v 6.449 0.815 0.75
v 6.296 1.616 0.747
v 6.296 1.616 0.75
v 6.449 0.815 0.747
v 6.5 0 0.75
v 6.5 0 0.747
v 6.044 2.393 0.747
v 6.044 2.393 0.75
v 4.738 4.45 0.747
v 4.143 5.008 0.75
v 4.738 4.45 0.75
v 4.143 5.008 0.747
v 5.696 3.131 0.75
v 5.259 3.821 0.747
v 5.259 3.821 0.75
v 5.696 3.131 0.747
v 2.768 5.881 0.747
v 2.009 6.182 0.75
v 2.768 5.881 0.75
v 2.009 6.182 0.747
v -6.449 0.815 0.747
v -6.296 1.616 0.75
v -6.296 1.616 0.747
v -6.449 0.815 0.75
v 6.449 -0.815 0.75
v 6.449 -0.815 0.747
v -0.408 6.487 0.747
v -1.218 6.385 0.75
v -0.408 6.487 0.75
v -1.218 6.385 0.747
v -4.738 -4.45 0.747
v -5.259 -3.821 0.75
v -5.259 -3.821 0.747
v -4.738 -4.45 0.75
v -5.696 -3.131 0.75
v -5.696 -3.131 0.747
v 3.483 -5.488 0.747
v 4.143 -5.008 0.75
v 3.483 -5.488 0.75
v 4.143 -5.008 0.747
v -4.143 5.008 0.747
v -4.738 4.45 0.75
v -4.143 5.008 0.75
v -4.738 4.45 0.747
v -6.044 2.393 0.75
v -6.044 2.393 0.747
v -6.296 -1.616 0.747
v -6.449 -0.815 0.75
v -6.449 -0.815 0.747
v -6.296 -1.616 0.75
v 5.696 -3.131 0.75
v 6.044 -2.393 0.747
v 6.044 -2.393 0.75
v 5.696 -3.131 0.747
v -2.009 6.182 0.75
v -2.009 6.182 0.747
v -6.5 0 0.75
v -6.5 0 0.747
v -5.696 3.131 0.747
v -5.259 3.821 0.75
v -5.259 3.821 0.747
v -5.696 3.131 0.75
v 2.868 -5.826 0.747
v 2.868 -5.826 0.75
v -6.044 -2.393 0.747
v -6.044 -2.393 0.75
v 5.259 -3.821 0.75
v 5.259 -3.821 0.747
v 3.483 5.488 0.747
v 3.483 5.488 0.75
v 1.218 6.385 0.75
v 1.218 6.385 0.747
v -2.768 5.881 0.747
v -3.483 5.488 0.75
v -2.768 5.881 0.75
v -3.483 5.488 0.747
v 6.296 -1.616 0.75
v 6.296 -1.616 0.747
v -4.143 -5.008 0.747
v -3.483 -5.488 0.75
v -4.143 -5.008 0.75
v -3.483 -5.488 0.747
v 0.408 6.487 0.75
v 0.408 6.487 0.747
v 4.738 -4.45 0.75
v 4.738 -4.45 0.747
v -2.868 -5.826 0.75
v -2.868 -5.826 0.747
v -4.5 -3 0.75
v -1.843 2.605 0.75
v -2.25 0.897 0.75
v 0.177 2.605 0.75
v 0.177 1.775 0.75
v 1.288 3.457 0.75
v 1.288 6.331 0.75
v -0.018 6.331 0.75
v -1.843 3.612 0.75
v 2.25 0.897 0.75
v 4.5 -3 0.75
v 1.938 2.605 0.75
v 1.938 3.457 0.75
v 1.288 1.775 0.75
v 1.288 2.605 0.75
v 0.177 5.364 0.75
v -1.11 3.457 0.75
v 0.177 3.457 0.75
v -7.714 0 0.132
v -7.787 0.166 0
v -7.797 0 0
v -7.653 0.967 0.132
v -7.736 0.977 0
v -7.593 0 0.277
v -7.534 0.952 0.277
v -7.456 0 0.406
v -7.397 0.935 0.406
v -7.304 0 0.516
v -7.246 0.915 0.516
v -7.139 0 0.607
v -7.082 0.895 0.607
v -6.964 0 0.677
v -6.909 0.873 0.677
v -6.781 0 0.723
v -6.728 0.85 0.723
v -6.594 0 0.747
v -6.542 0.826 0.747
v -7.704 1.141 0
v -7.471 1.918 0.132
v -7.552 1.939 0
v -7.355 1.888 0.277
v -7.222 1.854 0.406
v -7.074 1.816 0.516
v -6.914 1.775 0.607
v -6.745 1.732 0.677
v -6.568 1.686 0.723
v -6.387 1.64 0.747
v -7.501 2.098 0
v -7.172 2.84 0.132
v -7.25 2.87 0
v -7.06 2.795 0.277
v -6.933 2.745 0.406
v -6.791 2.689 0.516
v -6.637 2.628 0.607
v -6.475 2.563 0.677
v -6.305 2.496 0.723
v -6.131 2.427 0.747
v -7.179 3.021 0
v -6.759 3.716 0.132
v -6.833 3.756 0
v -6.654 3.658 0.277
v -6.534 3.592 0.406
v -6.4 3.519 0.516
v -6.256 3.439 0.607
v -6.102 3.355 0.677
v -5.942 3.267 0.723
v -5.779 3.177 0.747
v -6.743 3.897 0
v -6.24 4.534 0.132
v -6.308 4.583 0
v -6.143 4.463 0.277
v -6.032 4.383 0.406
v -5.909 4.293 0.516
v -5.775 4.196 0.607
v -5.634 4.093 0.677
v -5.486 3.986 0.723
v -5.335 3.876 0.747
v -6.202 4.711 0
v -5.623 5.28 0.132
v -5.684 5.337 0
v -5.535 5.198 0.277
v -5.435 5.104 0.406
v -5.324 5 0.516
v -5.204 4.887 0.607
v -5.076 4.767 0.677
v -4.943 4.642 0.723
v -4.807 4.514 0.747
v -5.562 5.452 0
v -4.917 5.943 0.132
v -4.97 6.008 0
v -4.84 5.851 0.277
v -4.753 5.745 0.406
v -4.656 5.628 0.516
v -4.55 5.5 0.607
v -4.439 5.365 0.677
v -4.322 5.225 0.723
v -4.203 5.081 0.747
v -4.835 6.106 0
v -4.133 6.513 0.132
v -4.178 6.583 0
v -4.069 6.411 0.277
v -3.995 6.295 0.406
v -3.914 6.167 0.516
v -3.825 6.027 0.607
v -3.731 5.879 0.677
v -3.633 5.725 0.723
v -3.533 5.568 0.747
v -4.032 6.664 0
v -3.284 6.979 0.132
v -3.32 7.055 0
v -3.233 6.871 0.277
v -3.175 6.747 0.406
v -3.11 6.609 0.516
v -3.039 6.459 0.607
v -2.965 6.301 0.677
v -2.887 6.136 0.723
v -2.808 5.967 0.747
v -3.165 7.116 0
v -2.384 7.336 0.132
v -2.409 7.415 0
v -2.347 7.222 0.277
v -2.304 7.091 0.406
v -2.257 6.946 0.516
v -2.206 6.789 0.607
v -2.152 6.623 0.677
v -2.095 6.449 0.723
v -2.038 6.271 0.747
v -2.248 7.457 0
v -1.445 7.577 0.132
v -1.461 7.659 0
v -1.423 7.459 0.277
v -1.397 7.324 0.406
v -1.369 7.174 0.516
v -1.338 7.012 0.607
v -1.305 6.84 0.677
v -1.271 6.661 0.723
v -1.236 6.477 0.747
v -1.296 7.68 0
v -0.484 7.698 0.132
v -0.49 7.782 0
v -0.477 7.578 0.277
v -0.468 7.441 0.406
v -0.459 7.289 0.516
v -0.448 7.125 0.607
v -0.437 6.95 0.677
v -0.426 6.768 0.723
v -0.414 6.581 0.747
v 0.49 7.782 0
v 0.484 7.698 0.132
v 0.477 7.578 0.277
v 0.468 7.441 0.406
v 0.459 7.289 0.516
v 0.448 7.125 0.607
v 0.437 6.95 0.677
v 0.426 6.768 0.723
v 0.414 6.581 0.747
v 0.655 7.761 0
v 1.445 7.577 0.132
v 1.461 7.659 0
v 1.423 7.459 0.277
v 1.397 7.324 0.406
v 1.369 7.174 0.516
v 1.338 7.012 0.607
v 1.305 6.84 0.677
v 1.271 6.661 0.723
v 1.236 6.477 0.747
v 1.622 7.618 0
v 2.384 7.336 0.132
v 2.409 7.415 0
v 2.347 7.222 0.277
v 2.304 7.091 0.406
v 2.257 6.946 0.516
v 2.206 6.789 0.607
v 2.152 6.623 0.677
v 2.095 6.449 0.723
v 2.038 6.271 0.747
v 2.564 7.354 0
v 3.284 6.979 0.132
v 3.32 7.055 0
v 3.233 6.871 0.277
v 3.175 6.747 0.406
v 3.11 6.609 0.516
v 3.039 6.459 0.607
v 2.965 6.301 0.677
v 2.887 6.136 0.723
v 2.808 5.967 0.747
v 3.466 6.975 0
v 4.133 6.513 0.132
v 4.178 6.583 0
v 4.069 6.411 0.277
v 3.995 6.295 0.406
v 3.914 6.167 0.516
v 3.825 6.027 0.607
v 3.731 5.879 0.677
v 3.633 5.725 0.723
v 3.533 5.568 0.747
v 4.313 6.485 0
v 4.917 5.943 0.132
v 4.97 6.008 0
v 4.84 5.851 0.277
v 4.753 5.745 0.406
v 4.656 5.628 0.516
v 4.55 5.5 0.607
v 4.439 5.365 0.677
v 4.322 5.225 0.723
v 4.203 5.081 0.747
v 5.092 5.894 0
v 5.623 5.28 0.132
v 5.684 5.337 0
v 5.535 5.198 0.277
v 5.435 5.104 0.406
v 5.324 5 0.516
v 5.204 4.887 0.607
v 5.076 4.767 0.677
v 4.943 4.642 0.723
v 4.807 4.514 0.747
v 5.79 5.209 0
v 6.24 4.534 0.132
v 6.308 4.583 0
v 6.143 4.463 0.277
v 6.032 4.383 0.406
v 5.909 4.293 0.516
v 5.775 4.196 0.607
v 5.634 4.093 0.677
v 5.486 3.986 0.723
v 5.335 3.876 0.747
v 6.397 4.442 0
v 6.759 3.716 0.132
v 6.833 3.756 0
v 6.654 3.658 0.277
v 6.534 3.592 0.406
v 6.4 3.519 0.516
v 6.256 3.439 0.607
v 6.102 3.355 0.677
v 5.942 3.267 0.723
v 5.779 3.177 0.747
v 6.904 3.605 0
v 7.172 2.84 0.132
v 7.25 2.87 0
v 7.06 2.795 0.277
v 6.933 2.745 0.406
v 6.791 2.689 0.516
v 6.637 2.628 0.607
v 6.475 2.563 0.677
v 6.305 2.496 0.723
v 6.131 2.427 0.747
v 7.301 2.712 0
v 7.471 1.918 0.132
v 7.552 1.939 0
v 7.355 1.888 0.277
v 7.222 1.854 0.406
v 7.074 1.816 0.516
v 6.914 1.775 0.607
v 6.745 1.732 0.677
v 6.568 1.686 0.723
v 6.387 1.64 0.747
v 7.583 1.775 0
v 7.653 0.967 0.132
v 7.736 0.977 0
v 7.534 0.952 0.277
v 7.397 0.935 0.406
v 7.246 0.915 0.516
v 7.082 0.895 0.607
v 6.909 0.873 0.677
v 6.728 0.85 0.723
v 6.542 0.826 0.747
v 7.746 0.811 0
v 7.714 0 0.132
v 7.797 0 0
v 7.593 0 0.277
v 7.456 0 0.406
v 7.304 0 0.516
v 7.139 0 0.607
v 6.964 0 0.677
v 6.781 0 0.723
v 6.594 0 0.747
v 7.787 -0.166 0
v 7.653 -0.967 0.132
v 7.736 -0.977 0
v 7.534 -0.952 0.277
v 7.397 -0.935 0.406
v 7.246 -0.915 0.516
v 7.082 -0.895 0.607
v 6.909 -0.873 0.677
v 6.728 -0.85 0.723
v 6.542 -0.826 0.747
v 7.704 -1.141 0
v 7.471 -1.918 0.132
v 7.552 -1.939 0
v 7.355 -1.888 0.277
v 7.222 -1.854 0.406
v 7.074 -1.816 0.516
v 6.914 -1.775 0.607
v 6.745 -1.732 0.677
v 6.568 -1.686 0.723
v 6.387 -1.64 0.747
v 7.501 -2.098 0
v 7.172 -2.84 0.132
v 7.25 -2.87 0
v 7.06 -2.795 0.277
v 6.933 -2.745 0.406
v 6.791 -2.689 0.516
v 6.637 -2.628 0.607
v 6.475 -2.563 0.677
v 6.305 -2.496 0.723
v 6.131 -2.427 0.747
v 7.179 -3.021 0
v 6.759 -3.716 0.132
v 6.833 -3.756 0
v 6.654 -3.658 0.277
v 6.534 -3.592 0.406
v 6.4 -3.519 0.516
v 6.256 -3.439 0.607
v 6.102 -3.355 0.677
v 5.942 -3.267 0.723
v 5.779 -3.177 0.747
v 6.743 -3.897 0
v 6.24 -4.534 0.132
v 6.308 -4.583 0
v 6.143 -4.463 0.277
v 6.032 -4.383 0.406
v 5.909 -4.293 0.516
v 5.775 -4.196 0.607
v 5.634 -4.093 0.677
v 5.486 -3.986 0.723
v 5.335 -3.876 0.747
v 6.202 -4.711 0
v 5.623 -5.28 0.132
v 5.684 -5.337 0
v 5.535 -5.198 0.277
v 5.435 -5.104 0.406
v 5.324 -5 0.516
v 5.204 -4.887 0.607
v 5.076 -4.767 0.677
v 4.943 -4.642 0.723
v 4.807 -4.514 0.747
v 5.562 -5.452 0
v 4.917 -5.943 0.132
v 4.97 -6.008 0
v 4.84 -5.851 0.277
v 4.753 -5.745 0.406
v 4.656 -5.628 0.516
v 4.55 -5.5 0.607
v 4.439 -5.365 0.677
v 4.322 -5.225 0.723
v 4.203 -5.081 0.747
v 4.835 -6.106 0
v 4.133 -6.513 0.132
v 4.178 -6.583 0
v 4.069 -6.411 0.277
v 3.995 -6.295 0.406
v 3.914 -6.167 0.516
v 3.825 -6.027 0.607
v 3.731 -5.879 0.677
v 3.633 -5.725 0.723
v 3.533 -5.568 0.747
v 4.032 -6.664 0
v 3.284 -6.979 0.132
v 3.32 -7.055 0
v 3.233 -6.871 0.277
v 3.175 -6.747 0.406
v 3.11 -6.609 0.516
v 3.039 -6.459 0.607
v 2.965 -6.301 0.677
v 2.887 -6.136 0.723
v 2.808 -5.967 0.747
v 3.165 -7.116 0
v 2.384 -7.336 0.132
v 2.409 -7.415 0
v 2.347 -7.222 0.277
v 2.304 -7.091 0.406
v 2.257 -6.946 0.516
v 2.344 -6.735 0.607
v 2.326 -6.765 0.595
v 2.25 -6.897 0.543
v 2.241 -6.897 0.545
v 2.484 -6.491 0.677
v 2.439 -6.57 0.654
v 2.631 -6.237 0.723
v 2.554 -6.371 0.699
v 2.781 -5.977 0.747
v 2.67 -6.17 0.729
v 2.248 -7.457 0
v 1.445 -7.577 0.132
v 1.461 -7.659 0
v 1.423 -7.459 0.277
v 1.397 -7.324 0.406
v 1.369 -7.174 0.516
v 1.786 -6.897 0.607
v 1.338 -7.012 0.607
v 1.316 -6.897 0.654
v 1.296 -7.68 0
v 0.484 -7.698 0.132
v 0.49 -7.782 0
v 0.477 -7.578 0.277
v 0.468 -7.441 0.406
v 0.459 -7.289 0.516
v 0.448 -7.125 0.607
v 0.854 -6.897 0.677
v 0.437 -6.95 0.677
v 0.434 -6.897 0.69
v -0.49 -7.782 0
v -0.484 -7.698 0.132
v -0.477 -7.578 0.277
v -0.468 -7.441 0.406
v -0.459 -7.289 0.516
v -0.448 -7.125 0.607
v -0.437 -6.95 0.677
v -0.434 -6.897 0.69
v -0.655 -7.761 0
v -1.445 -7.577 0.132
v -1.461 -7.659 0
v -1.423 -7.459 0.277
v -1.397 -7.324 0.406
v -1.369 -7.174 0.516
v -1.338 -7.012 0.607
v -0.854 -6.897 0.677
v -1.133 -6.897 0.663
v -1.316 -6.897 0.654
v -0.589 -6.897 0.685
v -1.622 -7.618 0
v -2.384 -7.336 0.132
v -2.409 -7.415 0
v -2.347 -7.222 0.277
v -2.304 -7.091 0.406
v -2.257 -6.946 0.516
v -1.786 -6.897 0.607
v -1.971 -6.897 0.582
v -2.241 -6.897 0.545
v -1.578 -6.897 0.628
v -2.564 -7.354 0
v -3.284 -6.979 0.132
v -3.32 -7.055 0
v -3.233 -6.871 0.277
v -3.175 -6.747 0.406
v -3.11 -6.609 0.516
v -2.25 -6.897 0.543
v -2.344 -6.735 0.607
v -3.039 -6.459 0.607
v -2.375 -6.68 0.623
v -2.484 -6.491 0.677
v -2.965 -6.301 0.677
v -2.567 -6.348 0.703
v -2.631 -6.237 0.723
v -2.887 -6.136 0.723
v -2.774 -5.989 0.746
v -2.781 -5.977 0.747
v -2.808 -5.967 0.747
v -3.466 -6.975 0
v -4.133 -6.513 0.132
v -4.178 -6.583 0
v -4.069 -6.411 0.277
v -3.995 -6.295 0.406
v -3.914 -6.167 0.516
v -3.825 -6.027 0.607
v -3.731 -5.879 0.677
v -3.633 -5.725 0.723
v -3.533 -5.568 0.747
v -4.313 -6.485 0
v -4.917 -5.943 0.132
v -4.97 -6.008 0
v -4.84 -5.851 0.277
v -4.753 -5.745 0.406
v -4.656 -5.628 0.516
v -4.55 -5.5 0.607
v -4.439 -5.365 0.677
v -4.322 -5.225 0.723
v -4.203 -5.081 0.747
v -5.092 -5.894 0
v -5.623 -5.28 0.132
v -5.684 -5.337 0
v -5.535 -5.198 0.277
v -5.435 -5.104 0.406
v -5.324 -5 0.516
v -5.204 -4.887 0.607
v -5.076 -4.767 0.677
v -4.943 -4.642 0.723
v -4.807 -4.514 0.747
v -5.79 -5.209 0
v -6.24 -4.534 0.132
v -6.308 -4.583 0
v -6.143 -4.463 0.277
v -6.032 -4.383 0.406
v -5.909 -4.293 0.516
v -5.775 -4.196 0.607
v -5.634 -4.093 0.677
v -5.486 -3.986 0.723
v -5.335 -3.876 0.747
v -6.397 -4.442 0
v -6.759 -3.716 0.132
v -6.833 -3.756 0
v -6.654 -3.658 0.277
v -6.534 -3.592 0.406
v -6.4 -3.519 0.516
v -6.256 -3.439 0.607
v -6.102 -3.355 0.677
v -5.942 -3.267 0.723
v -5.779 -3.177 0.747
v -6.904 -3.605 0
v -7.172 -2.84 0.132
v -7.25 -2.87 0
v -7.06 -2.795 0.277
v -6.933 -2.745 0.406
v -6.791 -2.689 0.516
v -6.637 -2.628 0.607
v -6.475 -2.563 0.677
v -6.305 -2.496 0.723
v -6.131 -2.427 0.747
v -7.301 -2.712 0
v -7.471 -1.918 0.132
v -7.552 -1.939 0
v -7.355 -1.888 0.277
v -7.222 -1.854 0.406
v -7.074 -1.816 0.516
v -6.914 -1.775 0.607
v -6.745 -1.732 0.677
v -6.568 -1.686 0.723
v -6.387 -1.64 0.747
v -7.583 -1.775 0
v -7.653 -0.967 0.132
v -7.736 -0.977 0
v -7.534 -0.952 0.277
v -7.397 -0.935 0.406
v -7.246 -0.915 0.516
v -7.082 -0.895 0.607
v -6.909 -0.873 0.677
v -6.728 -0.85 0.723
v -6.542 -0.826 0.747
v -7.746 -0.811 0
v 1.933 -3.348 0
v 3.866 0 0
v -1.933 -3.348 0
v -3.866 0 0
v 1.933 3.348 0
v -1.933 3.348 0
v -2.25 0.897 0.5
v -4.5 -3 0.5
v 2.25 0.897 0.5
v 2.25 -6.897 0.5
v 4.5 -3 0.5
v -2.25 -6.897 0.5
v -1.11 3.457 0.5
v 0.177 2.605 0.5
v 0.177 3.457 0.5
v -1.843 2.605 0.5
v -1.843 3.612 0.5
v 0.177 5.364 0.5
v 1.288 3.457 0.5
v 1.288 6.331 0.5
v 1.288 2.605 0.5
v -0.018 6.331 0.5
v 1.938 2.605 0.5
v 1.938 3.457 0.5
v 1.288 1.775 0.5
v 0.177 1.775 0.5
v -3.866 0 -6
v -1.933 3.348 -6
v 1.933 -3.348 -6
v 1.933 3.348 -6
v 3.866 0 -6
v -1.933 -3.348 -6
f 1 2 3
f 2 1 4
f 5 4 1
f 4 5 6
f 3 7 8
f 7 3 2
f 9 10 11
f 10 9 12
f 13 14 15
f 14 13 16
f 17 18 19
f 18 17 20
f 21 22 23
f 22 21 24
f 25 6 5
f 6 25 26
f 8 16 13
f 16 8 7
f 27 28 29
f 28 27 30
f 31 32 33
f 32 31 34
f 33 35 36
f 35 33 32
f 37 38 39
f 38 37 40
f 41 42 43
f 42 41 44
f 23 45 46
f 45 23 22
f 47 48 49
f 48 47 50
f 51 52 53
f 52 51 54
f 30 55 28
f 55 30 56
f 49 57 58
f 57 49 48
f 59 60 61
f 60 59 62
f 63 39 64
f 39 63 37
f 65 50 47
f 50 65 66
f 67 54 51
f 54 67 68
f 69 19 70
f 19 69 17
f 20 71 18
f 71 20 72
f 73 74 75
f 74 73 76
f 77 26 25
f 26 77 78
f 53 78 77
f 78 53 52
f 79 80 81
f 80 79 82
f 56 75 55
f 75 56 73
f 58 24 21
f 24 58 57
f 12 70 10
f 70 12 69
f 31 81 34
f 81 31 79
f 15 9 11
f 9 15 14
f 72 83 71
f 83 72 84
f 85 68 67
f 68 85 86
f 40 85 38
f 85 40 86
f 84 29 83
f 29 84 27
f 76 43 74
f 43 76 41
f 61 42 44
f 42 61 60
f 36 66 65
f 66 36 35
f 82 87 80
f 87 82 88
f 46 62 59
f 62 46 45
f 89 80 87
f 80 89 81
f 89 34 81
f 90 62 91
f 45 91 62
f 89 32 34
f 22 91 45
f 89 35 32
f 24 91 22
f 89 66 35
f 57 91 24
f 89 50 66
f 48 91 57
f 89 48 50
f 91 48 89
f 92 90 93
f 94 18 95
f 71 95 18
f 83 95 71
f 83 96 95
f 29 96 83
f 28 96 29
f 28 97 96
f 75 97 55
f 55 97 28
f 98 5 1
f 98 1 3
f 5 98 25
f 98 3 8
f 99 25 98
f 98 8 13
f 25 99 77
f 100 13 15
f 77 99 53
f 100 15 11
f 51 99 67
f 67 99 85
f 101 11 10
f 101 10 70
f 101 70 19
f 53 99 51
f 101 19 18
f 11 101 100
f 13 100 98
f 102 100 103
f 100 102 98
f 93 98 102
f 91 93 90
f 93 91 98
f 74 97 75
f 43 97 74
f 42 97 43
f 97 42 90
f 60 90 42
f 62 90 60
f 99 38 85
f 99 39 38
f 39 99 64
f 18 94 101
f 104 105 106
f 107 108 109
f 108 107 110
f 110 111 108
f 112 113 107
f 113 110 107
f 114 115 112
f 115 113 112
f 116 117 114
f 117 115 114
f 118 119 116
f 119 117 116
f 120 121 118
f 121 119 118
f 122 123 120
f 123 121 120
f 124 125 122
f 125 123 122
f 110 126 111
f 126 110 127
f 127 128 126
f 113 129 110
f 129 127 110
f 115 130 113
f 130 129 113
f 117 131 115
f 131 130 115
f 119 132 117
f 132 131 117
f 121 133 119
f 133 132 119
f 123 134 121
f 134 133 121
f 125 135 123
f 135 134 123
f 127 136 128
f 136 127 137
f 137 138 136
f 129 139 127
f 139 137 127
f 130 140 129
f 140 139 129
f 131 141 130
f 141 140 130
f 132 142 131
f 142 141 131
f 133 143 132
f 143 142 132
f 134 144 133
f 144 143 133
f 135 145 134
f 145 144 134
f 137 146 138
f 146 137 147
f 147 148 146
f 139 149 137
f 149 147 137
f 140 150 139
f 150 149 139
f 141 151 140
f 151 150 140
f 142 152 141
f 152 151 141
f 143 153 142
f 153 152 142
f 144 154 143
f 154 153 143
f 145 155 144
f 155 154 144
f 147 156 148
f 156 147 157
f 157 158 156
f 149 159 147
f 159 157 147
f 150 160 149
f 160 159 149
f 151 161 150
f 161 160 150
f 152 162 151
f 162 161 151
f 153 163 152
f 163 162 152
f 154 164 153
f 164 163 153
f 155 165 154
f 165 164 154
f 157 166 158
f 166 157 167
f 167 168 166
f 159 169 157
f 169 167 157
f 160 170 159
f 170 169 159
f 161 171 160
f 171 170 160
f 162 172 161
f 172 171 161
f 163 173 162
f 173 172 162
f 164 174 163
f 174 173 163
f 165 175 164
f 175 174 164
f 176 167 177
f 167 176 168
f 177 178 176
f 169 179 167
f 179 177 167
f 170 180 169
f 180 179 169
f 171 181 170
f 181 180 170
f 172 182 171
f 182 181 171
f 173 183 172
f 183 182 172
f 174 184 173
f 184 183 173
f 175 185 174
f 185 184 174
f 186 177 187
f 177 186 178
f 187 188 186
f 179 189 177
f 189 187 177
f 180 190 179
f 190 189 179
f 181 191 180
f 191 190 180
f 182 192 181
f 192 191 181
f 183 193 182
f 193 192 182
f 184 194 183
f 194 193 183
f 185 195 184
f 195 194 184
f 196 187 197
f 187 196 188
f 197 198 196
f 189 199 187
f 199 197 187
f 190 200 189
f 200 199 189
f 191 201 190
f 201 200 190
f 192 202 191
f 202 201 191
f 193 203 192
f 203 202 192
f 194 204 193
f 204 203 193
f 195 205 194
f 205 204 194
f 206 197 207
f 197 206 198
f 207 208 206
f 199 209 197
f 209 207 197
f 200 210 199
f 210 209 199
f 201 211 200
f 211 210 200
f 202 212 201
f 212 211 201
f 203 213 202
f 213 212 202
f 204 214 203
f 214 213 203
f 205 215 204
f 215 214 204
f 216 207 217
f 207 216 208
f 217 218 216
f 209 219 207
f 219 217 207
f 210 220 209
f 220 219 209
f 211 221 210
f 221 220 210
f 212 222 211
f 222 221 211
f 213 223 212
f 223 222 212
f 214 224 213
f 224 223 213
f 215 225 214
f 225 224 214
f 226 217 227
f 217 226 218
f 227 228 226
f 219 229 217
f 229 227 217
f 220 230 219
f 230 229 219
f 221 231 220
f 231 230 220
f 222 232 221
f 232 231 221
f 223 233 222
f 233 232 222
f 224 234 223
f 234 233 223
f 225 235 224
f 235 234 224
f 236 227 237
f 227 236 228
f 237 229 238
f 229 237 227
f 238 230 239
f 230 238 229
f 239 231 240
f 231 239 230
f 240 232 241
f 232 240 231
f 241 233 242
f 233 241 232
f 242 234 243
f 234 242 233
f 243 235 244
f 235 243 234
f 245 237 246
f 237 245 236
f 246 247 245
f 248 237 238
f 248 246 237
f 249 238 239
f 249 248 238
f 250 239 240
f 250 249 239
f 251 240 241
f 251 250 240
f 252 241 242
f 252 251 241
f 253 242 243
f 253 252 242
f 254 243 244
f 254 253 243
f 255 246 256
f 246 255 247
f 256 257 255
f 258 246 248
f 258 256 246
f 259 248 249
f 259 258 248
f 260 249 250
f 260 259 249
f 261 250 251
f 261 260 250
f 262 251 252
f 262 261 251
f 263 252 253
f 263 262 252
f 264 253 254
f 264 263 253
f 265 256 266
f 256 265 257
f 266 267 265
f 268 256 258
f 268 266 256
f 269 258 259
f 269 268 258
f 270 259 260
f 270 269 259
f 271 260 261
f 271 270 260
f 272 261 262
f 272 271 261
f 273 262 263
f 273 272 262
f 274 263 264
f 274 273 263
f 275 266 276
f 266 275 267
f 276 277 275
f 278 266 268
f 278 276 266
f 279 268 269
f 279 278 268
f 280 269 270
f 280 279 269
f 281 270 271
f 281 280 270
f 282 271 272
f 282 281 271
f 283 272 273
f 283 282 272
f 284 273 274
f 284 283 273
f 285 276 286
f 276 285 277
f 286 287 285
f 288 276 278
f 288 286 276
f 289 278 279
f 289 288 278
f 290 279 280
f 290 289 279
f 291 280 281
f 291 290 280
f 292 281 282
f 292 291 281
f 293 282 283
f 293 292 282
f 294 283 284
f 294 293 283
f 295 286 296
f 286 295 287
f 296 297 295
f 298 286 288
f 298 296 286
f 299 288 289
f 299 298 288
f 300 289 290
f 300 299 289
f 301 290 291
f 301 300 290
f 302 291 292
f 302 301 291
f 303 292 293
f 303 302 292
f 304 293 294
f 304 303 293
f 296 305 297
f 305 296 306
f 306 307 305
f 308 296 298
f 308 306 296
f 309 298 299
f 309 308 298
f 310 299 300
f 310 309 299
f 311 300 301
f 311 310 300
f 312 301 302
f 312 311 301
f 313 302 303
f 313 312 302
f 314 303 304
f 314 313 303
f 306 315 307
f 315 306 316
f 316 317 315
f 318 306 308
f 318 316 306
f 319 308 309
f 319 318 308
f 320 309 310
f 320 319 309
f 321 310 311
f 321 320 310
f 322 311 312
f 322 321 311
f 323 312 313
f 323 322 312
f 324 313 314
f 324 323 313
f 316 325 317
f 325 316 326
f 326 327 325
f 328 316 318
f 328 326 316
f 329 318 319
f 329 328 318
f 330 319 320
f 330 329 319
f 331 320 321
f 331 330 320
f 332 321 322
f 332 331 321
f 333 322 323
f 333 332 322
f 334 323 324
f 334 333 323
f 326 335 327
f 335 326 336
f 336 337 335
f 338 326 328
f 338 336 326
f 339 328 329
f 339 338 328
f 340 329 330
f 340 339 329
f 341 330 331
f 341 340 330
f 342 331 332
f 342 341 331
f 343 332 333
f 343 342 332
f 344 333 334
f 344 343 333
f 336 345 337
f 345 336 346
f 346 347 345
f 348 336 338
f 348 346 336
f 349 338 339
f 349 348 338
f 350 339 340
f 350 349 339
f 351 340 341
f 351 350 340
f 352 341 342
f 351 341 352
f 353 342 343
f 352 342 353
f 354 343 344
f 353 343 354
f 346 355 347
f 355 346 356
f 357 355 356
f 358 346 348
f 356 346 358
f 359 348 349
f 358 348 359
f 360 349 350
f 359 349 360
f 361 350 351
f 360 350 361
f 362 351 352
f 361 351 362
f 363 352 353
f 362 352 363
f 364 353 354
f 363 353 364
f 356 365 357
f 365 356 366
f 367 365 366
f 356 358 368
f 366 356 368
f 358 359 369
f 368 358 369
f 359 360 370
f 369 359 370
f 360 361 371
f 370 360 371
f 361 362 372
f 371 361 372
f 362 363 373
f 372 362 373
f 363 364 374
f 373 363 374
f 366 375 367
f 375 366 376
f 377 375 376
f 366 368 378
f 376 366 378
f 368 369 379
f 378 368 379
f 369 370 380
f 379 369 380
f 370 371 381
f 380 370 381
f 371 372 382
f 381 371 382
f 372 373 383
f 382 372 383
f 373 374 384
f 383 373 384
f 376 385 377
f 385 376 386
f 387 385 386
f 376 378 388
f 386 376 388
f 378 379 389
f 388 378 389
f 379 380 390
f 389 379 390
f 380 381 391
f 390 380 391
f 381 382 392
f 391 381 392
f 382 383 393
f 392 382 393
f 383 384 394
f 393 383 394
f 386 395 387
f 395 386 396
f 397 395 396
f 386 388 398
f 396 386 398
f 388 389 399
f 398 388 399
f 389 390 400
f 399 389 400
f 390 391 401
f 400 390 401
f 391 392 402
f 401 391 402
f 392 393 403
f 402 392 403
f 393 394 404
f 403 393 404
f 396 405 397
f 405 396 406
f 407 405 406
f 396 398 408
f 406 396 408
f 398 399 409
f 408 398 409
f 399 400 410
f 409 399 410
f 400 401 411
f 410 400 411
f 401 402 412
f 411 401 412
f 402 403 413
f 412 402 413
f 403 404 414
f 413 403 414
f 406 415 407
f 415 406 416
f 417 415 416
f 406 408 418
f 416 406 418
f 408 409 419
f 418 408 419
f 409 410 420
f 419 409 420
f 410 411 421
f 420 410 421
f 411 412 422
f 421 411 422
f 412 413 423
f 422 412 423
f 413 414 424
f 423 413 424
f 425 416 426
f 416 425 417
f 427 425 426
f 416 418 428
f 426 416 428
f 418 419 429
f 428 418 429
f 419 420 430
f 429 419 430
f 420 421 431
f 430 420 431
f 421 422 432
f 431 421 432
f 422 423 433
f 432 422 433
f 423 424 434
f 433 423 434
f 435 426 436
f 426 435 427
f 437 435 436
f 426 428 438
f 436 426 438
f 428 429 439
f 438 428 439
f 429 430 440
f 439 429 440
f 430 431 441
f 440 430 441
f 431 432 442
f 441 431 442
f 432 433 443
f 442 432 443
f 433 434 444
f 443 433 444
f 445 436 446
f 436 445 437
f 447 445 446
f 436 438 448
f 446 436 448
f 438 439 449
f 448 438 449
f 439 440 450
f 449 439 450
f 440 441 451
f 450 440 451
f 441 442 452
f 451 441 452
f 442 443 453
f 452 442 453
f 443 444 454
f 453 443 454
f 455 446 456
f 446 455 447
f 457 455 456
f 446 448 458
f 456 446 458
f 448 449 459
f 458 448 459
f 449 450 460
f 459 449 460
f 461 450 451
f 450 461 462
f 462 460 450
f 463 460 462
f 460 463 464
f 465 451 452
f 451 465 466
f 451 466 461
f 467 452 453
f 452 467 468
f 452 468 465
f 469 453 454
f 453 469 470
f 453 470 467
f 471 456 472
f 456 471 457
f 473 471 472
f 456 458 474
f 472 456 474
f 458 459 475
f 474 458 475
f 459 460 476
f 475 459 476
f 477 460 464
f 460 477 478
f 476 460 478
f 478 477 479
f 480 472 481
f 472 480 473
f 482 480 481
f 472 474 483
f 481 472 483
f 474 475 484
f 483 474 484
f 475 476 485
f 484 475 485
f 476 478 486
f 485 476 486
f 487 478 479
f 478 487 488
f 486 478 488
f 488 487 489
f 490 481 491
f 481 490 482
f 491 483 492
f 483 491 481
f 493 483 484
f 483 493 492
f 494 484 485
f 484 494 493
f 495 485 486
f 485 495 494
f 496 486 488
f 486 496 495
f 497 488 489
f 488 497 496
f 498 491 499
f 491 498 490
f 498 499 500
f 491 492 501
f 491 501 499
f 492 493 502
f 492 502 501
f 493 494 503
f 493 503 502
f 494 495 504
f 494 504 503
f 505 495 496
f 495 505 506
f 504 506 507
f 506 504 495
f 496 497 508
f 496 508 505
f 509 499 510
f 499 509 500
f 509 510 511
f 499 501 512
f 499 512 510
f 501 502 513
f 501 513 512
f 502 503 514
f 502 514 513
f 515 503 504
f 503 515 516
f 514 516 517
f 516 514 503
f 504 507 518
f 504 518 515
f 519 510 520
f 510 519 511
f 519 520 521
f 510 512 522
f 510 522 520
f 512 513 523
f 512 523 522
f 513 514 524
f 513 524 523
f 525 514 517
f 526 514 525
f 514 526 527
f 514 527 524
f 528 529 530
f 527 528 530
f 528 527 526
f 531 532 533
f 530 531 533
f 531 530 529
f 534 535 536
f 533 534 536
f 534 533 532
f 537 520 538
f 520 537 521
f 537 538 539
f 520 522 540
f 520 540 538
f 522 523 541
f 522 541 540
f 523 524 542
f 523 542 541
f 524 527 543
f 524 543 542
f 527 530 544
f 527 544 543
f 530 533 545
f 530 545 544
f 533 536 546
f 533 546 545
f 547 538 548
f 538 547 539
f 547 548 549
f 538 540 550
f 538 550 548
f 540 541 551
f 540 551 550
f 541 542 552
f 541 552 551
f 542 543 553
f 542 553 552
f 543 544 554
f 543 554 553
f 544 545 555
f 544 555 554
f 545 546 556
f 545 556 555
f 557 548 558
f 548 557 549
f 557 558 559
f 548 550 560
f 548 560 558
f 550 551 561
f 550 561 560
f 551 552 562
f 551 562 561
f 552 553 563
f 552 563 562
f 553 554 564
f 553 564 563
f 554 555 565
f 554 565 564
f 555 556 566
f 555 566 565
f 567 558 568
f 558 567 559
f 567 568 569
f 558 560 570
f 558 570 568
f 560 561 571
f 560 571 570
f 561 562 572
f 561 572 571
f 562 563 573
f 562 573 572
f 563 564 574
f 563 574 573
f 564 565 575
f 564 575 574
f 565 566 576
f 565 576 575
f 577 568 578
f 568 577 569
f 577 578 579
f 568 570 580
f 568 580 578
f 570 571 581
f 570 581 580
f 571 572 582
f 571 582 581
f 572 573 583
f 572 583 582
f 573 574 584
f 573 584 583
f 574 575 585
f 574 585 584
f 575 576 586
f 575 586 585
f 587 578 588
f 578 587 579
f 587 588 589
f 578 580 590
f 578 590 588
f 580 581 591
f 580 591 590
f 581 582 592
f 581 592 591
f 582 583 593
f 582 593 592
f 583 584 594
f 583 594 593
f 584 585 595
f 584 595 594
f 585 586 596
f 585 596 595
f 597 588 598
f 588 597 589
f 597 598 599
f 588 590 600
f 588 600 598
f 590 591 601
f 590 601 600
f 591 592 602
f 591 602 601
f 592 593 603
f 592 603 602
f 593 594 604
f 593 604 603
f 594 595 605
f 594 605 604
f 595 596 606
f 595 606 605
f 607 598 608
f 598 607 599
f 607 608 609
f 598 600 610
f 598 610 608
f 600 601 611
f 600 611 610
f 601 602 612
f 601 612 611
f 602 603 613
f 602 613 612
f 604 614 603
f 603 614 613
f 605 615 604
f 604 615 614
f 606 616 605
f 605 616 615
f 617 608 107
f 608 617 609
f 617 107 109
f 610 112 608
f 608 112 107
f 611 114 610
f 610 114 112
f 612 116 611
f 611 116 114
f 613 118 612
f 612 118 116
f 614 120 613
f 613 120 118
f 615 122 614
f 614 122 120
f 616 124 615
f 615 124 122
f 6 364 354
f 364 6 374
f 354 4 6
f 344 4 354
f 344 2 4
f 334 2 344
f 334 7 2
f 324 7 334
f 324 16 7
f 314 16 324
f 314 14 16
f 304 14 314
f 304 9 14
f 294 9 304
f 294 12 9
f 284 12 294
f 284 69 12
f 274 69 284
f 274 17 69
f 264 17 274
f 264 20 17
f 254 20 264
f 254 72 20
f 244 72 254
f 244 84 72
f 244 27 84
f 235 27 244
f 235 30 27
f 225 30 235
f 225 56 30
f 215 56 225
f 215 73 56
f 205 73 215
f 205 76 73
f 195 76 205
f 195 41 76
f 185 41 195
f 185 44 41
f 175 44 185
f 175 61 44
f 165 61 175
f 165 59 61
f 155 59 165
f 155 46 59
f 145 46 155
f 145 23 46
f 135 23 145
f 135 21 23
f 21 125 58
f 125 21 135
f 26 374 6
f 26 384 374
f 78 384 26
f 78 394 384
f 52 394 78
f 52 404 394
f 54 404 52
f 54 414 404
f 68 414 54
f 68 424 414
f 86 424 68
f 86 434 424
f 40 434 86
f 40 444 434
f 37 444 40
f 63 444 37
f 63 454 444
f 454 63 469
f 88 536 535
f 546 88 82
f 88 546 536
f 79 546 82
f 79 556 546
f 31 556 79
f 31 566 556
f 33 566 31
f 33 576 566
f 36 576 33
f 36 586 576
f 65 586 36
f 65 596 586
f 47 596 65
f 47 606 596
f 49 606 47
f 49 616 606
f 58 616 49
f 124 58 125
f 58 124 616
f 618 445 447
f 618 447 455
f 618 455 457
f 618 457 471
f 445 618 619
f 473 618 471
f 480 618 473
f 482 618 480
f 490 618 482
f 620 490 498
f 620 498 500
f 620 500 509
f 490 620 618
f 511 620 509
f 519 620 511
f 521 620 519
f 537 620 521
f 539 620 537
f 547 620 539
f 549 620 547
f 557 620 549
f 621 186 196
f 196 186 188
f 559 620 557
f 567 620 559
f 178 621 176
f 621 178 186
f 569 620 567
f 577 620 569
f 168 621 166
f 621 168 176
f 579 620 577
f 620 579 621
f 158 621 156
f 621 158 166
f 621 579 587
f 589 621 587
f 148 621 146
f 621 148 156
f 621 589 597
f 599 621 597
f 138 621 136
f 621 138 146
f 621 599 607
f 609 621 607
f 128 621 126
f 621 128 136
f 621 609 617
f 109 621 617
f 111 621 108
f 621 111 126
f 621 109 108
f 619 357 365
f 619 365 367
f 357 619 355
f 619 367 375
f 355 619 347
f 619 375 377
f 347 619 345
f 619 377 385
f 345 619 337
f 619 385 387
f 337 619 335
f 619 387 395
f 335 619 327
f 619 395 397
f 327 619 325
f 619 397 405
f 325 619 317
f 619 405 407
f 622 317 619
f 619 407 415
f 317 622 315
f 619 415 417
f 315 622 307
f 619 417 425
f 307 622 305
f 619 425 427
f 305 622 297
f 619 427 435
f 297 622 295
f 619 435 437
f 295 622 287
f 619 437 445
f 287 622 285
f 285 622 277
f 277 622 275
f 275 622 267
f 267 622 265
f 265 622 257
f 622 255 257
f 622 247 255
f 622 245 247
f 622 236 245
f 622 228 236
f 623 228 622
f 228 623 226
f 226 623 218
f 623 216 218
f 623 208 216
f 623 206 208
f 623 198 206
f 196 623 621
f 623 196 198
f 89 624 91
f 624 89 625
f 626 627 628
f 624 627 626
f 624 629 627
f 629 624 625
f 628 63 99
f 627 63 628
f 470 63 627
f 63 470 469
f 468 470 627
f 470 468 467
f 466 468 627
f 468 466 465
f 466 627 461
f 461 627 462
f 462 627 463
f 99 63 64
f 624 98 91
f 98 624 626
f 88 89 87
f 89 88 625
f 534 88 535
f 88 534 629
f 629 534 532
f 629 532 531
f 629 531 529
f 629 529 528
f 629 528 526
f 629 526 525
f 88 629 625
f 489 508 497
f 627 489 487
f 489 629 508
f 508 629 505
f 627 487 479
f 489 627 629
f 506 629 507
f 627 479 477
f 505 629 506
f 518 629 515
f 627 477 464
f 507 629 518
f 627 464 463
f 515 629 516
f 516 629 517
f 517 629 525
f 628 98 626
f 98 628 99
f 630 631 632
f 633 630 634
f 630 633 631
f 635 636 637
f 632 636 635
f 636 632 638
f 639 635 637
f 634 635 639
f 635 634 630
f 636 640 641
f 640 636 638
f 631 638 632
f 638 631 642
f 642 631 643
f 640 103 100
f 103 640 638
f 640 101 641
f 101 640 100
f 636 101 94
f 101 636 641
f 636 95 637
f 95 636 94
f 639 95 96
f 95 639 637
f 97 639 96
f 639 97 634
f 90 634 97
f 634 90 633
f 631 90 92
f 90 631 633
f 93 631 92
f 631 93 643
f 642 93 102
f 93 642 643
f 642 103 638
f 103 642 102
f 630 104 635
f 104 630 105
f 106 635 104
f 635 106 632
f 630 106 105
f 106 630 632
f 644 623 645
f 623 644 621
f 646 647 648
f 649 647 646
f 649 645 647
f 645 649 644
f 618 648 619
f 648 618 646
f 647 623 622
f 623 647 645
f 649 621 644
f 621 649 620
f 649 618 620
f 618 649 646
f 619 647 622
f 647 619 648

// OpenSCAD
$fn = 50;


union() {
	difference() {
		union() {
			translate(v = [0, 0, -0.7500000000]) {
				cylinder(h = 1.5000000000, r = 6.5000000000);
			}
			translate(v = [0, 0, -0.7500000000]) {
				rotate_extrude(angle = 360) {
					translate(v = [6.5000000000, 0, 0]) {
						circle(r = 1.5000000000);
					}
				}
			}
		}
		union() {
			translate(v = [-25.0000000000, -25.0000000000, -50]) {
				cube(size = [50, 50, 50]);
			}
			translate(v = [0, -3, 0.5000000000]) {
				#linear_extrude(height = 0.2500000000) {
					polygon(points = [[4.5000000000, 0.0000000000], [2.2500000000, 3.8971143170], [-2.2500000000, 3.8971143170], [-4.5000000000, 0.0000000000], [-2.2500000000, -3.8971143170], [2.2500000000, -3.8971143170]]);
				}
			}
			#translate(v = [0, 4, 0.5000000000]) {
				linear_extrude(height = 0.2500000000) {
					text(font = "SegoiUI:Bold", halign = "center", size = 4.5000000000, text = "4", valign = "center");
				}
			}
		}
	}
	union() {
		translate(v = [0, 0, -6]) {
			linear_extrude(height = 6) {
				polygon(points = [[3.8658550000, 0.0000000000], [1.9329275000, 3.3479286373], [-1.9329275000, 3.3479286373], [-3.8658550000, 0.0000000000], [-1.9329275000, -3.3479286373], [1.9329275000, -3.3479286373]]);
			}
		}
	}
}
